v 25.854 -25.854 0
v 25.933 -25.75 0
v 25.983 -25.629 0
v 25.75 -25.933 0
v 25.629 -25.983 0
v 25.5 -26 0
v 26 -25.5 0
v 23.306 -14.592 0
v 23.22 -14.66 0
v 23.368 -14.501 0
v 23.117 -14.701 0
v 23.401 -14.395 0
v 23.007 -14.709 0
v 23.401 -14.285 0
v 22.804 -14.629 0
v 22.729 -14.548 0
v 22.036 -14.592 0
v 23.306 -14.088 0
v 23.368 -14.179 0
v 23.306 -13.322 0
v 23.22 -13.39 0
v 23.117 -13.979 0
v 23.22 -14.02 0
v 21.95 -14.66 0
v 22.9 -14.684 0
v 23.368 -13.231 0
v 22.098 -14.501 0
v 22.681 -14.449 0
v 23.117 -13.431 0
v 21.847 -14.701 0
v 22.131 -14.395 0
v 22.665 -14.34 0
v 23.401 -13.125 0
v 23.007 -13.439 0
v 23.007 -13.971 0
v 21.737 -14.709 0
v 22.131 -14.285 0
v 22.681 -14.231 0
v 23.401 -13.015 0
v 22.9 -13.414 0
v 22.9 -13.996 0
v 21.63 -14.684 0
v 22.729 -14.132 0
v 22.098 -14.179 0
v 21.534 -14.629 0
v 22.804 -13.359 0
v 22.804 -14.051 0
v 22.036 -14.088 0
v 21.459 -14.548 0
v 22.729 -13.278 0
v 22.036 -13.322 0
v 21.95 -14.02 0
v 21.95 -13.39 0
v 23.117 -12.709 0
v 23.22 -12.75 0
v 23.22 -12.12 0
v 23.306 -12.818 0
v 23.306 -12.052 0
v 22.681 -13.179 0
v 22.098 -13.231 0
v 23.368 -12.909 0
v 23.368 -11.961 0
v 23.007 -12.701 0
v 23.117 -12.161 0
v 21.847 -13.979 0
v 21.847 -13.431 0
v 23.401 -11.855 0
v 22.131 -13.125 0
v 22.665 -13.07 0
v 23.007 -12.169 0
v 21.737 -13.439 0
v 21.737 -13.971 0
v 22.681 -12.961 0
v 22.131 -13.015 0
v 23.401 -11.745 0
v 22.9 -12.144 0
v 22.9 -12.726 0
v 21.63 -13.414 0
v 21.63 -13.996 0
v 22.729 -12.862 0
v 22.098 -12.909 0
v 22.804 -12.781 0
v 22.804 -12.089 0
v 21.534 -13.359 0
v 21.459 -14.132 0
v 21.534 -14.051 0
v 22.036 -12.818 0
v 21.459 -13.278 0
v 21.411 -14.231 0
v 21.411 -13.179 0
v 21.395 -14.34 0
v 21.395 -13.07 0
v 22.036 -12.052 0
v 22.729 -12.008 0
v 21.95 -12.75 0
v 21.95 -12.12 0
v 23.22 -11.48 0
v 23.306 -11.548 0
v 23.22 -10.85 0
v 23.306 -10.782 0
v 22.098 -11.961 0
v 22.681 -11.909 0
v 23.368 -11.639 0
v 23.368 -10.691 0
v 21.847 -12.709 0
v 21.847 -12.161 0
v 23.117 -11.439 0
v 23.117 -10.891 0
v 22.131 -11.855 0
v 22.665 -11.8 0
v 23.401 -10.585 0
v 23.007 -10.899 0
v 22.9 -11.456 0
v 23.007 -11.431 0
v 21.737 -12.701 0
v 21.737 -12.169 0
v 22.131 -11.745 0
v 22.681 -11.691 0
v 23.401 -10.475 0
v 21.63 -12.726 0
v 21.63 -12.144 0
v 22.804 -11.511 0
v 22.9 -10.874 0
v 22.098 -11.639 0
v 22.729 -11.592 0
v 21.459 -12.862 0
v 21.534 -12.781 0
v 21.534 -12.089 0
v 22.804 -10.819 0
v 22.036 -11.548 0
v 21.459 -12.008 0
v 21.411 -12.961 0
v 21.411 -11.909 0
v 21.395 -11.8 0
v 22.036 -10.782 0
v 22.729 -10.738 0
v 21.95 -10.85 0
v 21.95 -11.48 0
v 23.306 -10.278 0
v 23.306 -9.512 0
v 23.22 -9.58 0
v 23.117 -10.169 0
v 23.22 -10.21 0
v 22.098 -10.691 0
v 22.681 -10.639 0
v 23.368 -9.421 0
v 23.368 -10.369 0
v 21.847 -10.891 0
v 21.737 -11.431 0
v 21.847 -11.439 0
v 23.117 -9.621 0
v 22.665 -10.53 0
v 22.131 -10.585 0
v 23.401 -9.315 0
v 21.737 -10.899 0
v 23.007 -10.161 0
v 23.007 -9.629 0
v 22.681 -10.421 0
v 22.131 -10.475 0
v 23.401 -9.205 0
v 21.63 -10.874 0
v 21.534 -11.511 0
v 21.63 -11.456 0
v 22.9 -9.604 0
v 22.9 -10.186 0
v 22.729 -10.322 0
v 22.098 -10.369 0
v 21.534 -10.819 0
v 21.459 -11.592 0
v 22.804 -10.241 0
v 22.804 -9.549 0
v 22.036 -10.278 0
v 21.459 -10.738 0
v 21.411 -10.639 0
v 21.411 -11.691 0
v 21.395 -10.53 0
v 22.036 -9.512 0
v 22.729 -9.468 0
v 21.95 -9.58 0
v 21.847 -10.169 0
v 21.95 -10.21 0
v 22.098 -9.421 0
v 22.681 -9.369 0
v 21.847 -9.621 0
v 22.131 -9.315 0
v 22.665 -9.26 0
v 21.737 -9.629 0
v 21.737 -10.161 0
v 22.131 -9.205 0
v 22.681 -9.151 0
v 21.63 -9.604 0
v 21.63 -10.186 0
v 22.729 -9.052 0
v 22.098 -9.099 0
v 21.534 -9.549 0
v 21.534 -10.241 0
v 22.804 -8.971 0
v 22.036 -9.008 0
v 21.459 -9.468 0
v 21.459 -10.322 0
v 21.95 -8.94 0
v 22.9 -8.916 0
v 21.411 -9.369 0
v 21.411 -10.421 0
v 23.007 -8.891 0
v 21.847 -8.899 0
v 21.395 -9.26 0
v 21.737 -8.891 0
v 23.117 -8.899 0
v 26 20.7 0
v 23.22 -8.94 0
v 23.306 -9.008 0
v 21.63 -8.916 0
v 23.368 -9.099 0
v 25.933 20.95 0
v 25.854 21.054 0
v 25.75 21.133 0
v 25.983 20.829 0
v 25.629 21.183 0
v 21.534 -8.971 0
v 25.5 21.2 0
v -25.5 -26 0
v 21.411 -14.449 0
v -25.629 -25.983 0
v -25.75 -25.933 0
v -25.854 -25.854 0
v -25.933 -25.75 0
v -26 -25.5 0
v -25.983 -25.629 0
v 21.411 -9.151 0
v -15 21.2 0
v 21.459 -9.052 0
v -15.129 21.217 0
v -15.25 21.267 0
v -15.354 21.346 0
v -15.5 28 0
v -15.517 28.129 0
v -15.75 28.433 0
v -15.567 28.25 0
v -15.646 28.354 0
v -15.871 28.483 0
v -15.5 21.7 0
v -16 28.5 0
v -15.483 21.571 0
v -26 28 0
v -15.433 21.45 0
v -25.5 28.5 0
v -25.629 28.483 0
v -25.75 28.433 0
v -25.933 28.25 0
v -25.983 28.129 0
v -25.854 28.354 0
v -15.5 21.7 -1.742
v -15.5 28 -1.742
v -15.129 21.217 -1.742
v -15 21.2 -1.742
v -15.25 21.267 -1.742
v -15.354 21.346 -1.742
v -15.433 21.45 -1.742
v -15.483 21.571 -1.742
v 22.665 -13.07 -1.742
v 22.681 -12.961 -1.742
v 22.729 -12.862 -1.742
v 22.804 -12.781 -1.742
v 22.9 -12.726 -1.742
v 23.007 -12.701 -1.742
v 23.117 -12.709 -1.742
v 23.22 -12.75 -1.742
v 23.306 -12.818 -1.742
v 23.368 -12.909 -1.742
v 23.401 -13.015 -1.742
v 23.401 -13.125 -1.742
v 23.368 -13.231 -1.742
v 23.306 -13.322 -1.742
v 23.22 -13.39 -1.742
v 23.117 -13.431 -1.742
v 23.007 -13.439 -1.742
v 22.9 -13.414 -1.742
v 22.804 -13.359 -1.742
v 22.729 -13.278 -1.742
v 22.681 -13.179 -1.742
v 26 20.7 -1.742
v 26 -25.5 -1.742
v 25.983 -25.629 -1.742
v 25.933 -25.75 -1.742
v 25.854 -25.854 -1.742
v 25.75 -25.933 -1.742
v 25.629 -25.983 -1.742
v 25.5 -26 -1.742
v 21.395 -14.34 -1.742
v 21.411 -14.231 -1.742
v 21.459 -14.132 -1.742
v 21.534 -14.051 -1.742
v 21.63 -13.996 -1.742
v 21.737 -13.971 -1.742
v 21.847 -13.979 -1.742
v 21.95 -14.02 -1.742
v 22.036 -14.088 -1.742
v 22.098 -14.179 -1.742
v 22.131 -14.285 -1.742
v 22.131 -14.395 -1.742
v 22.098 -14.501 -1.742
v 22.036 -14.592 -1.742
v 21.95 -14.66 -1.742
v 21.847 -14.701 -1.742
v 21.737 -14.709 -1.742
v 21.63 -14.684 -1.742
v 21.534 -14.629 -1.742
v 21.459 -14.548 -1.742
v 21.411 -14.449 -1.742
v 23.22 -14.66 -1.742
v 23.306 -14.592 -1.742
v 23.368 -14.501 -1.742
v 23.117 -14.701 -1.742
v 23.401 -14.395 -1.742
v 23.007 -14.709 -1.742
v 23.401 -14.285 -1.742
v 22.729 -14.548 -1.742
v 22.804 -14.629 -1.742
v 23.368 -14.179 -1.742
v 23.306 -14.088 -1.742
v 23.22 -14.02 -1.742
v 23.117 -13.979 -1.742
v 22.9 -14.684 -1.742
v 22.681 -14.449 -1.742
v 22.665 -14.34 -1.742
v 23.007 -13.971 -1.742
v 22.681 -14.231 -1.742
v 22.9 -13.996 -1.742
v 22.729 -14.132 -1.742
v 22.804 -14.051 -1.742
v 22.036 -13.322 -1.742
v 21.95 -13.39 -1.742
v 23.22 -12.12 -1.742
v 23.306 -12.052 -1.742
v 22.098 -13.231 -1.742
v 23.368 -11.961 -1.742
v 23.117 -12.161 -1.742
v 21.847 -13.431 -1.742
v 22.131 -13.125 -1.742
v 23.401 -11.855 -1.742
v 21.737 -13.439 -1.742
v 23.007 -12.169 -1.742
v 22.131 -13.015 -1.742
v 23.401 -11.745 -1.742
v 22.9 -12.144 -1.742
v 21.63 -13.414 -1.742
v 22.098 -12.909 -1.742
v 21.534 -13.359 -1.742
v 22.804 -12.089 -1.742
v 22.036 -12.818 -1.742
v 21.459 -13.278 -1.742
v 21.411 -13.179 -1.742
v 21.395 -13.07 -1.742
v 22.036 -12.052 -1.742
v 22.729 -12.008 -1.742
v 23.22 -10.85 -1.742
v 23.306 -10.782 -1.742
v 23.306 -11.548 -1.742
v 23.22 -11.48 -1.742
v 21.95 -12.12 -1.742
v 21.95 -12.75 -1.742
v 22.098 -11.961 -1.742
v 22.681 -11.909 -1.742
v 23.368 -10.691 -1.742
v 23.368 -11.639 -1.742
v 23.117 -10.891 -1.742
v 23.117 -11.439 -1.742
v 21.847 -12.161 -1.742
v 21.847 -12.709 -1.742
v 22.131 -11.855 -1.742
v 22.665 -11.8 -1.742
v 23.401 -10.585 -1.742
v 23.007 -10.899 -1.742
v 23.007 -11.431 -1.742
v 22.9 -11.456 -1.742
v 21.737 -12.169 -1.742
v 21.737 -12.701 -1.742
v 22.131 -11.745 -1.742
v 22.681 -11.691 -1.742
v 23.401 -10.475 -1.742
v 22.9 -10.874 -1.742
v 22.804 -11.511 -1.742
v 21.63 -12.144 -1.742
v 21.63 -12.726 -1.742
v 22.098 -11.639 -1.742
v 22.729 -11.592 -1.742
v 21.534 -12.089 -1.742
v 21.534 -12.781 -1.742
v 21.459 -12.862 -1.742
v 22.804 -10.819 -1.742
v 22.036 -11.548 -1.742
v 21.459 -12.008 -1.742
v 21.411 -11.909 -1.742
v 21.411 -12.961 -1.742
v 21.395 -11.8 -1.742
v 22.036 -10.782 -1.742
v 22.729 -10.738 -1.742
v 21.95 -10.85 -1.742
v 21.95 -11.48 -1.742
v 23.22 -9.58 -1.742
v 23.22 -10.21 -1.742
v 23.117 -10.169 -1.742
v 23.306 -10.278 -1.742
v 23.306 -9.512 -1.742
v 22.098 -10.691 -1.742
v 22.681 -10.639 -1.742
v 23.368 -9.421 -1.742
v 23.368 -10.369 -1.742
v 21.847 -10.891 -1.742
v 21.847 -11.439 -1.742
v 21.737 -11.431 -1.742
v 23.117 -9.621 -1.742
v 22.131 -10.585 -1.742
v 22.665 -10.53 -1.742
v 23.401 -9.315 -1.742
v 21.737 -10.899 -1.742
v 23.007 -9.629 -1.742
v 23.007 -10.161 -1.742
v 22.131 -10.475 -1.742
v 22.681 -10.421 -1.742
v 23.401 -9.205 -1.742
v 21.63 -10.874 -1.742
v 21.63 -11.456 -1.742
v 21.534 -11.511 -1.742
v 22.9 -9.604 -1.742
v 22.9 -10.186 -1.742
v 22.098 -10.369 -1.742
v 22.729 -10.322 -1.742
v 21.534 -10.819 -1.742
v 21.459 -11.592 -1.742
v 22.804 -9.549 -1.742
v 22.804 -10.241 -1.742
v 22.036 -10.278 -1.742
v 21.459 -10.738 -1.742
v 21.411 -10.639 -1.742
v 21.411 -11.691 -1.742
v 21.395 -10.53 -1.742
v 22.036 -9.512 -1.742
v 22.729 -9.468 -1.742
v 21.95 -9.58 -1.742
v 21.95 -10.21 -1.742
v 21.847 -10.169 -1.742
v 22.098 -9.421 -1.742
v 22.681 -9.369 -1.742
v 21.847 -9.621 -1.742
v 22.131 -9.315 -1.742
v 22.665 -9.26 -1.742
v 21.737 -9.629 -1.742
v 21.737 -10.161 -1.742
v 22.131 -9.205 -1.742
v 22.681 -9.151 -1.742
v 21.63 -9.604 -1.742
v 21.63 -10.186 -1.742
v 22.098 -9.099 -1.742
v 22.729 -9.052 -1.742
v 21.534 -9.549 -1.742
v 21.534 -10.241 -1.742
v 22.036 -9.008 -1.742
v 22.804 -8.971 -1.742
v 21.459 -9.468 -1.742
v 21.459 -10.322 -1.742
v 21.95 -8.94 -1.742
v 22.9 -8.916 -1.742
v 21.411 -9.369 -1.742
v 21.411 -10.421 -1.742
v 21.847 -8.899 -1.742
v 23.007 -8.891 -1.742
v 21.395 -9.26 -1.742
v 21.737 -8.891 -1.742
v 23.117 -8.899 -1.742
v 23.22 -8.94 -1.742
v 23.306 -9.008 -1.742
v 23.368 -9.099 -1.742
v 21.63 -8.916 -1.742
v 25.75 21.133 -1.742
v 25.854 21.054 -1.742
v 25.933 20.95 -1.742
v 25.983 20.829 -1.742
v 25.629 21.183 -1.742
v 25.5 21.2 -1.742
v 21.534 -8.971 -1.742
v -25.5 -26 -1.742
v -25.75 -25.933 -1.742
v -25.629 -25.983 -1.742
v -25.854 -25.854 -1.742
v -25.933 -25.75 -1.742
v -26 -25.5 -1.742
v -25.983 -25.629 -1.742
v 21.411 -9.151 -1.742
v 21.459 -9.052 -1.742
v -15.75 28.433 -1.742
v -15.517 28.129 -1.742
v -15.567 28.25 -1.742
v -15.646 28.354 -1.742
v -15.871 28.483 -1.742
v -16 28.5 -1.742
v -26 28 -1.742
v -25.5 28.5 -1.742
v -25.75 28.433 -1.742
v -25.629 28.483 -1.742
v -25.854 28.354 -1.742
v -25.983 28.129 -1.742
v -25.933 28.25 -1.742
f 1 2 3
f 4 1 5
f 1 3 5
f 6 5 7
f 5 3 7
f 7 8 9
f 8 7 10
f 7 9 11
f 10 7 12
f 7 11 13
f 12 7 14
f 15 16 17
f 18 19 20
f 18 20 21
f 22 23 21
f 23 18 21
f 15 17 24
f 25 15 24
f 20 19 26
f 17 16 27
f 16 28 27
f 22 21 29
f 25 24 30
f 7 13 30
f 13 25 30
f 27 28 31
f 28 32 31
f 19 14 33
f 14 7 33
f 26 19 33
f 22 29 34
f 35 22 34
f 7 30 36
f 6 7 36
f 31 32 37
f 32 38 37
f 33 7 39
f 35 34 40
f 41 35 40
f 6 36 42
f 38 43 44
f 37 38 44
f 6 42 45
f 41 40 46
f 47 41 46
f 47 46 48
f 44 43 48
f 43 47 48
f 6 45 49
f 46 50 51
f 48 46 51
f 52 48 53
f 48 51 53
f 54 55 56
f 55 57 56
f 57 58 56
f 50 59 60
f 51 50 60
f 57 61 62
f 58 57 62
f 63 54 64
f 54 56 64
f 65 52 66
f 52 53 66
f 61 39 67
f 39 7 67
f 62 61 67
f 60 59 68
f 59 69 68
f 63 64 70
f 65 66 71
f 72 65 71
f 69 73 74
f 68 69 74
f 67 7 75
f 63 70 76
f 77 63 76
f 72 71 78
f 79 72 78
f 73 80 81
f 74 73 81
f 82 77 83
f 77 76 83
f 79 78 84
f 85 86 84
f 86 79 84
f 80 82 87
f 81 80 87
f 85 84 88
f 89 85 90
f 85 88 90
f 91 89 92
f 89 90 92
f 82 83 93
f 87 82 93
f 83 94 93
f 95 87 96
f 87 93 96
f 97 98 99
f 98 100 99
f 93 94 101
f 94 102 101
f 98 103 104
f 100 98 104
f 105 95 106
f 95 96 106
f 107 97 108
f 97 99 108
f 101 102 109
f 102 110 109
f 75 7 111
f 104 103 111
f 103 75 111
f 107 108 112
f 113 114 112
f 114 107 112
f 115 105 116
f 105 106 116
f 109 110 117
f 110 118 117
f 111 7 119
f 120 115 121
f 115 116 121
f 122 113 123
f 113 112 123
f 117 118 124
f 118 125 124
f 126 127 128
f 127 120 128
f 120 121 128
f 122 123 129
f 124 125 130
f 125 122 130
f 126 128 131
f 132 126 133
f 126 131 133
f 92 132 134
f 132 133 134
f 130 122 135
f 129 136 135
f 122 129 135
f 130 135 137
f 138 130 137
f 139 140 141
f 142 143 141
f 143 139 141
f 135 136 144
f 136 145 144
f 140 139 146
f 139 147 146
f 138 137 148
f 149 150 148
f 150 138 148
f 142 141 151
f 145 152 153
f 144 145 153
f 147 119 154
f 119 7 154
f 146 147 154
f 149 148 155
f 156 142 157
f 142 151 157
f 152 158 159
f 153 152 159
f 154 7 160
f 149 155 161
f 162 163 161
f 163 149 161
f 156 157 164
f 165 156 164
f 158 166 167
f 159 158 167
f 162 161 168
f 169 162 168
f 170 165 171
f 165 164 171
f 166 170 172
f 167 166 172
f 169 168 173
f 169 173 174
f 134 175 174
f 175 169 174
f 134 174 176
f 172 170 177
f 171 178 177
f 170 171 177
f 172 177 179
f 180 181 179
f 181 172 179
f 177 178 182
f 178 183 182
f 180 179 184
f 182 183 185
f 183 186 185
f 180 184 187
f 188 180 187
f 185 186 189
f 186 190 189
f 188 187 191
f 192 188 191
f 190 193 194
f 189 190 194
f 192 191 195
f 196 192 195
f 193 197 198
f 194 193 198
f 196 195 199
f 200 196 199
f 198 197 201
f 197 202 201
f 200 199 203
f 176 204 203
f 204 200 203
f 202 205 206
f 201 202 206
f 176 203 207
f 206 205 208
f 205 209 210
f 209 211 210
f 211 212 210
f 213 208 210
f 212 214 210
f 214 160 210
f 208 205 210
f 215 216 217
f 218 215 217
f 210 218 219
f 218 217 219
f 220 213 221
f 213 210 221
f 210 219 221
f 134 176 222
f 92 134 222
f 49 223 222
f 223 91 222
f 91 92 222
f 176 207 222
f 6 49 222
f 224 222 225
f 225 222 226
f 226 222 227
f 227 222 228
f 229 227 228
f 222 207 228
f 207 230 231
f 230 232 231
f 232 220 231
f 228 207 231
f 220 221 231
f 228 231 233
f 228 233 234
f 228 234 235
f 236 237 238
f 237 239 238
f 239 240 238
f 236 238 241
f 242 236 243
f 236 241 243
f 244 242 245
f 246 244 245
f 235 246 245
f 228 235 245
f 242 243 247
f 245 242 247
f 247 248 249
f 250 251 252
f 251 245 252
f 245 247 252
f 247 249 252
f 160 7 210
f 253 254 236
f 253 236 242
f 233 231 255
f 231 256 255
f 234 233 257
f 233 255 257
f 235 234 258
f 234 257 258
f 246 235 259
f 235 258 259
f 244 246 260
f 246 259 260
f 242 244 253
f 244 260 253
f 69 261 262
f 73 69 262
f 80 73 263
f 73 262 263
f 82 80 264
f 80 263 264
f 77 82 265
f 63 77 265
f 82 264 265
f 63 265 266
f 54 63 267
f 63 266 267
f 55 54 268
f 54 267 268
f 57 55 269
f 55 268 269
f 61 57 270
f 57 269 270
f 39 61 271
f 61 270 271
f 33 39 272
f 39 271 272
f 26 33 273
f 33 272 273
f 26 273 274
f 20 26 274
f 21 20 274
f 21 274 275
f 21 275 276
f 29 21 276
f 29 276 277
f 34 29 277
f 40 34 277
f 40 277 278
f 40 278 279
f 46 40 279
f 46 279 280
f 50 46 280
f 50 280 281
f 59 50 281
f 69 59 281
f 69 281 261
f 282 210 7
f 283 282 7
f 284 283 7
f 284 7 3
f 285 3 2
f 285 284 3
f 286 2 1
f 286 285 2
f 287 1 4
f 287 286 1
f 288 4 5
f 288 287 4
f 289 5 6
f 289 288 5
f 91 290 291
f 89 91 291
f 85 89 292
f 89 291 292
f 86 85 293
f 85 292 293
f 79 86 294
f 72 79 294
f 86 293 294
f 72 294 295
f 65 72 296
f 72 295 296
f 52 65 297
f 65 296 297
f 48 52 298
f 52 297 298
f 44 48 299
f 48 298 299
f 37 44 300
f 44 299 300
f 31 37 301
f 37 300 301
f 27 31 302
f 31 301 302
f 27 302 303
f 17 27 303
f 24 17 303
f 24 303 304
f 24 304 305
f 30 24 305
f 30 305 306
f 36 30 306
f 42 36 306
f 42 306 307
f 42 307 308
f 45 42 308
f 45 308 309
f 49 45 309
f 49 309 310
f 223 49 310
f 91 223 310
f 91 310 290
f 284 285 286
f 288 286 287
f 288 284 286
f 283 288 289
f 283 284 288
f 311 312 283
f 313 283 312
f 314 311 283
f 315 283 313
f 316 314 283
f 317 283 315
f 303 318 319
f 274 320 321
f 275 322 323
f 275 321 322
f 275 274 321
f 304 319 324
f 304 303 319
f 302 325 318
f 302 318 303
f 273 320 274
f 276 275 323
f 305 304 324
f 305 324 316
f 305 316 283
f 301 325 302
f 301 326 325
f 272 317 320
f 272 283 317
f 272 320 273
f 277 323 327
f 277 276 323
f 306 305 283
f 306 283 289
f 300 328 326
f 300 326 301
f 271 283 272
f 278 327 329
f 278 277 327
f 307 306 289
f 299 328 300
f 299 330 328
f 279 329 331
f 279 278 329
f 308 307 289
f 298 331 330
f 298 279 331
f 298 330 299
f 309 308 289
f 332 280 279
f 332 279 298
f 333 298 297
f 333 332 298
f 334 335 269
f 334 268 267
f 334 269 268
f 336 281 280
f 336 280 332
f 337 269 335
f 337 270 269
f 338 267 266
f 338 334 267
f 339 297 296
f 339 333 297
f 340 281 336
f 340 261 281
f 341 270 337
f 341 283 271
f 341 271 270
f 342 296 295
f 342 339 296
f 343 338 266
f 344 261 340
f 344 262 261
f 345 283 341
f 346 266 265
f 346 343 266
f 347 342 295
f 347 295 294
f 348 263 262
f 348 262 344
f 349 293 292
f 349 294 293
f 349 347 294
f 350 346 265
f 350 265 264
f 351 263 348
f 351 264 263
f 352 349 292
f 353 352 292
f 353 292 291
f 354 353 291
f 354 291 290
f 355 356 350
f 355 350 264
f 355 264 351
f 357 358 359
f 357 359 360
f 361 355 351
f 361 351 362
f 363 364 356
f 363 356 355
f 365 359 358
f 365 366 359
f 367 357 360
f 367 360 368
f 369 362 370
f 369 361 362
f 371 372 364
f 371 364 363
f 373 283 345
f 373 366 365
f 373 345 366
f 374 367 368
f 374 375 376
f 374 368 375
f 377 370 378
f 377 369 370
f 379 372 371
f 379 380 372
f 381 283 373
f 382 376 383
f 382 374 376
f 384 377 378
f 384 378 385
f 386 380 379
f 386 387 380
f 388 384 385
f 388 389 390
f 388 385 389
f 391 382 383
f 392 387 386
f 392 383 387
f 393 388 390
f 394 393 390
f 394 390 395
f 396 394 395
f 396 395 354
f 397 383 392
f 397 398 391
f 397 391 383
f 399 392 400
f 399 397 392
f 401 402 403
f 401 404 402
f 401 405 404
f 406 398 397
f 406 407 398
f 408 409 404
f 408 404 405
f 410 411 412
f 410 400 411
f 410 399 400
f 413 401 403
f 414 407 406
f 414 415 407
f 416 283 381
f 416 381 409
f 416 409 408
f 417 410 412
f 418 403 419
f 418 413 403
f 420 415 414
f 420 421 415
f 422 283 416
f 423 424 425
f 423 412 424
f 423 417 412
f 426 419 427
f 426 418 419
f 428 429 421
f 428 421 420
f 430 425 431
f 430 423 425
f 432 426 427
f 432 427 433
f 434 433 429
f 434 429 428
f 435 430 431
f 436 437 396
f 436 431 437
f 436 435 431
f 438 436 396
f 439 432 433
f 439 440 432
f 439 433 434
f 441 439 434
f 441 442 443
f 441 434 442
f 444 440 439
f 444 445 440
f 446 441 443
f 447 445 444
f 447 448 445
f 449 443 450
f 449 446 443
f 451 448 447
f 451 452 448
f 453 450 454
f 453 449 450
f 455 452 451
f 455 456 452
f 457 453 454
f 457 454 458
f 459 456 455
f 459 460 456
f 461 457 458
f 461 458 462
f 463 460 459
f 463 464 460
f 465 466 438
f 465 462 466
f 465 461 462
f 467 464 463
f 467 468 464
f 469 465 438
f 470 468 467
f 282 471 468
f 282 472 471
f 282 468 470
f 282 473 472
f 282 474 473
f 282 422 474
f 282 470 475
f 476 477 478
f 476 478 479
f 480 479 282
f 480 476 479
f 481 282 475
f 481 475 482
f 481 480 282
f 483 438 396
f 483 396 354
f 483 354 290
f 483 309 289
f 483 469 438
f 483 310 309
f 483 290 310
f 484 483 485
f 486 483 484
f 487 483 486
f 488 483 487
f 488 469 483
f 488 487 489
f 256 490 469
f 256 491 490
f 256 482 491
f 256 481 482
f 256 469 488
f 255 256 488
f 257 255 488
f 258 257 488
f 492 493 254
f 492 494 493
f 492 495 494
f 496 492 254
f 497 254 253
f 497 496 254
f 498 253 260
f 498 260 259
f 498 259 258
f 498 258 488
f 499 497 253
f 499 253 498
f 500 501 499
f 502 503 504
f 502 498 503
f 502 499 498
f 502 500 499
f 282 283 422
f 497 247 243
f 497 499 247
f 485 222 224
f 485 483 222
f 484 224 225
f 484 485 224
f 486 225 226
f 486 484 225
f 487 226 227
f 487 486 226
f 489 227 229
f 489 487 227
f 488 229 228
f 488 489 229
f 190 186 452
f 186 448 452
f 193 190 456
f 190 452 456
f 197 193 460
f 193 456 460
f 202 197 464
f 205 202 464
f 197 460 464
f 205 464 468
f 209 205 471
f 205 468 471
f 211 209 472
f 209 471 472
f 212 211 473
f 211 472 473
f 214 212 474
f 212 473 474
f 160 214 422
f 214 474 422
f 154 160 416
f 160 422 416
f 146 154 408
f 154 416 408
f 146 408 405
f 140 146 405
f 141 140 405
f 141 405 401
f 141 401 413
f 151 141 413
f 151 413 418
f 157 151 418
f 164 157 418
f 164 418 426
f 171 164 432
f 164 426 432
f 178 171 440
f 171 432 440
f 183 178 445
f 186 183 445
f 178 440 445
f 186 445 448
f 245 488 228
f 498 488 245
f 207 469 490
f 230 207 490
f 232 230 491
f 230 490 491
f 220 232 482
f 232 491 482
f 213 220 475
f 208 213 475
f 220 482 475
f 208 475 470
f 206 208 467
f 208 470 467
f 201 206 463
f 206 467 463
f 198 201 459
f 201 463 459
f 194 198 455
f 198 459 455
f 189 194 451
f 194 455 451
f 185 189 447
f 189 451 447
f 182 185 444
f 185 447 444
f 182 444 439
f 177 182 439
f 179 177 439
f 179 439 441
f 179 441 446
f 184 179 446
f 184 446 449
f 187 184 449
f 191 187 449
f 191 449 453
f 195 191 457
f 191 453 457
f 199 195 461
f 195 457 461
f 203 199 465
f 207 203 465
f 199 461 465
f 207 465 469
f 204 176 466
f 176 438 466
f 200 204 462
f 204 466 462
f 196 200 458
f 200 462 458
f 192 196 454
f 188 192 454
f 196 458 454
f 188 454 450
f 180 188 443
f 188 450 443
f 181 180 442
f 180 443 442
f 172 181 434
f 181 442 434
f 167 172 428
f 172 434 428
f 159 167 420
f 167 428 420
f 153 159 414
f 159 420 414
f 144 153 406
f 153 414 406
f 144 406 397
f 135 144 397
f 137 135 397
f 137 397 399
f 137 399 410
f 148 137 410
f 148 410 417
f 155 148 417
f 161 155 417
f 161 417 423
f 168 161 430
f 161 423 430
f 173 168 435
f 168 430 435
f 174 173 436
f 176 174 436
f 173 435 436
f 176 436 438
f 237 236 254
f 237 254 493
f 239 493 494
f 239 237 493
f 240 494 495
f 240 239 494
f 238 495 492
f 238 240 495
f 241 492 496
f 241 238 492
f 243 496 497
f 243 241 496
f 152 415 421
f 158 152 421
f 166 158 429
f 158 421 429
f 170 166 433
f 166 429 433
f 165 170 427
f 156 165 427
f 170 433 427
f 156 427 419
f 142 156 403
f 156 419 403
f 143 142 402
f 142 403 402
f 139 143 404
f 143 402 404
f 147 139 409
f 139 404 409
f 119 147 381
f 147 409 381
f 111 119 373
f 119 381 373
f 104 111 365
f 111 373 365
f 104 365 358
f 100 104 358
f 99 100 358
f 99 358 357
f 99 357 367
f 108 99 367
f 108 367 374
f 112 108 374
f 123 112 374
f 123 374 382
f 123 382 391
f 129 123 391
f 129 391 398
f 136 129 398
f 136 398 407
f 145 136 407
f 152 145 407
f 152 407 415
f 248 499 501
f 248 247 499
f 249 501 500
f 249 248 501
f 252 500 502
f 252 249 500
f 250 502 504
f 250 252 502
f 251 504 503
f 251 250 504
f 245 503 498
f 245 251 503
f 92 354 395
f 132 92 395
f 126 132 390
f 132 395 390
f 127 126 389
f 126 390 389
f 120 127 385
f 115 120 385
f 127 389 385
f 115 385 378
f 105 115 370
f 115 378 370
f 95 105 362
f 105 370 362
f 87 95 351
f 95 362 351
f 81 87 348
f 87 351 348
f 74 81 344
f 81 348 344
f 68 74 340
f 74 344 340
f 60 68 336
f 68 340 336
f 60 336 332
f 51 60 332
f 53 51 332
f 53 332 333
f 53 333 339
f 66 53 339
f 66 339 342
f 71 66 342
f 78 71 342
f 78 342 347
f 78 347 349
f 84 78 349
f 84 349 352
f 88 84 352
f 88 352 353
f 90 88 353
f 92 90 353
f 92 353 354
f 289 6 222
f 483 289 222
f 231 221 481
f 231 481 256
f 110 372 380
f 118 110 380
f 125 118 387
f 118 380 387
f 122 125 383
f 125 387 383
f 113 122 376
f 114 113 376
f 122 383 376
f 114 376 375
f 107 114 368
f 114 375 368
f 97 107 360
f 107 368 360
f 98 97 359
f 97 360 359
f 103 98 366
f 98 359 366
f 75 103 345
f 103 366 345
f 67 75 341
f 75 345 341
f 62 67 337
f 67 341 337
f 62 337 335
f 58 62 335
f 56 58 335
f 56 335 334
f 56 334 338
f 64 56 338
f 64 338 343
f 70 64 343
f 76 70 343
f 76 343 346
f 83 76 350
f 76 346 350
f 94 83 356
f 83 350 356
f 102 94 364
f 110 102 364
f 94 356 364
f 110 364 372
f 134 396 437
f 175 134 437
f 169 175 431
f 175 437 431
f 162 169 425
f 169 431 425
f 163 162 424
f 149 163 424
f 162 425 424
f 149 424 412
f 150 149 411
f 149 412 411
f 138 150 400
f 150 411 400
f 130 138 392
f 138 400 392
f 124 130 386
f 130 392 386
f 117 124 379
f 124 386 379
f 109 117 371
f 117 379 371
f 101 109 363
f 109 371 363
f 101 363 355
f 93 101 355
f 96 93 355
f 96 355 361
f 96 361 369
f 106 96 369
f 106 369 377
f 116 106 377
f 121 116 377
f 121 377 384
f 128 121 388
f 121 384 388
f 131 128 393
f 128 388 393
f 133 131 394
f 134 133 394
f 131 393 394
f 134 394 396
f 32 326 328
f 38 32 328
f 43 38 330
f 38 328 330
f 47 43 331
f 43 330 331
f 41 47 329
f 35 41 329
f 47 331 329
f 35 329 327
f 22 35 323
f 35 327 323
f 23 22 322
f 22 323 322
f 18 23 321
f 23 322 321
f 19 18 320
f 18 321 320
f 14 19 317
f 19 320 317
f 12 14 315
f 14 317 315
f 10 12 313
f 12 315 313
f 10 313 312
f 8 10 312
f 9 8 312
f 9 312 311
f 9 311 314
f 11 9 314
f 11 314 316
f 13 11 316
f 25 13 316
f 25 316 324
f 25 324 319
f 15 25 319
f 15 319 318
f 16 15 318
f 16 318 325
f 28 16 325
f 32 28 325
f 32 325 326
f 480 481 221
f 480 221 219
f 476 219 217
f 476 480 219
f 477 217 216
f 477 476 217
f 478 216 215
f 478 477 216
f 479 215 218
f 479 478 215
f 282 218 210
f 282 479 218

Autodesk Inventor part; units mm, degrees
ref_plane "YZ Plane" through (0, 0, 0) normal (1, 0, 0) x (0, 1, 0)
ref_plane "XZ Plane" through (0, 0, 0) normal (0, 1, 0) x (-1, 0, 0)
sketch "Boceto1" plane through (0, 0, 0) normal (0, 0, 1) x (1, 0, 0)
  line L0 (-26, 26) -> (26, 26)
  line L1 (26, 26) -> (26, -26)
  line L2 (26, -26) -> (-26, -26)
  line L3 (-26, -26) -> (-26, 26)
  line L4 (-26, 26) -> (26, -26) construction
  line L5 (26, 26) -> (-26, -26) construction
  point P0 (0, 0)
  dimension "d0" = 52
  dimension "d1" = 52
extrude "Extrusión1" add sketch "Boceto1" against normal blind 1.742
fillet "Empalme1" radius 0.5 4 edges at (26, 26, -0.871) (-26, 26, -0.871) (-26, -26, -0.871) (26, -26, -0.871)
ref_plane "Plano de trabajo1" through (0, 0, -1.6) normal (0, 0, 1) x (1, 0, 0)
sketch "Boceto6" plane through (0, 0, 0) normal (0, 0, 1) x (1, 0, 0)
  line L0 (-25.5, 26) -> (25.5, 26) construction
  line L1 (-25.5, 26) -> (25.5, 26) construction
  line L2 (-15.5, 26) -> (26, 26)
  line L3 (26, 26) -> (26, 21.2)
  line L4 (26, 21.2) -> (-15.5, 21.2)
  line L5 (-15.5, 21.2) -> (-15.5, 26)
  line L6 (26, 25.5) -> (26, -25.5) projected
  point P0 (0, 0)
  dimension "d14" = 4.8
  dimension "d15" = 41.5
extrude "Extrusión4" cut sketch "Boceto6" against normal through all
sketch "Boceto7" plane through (0, 0, -1.742) normal (0, 0, -1) x (-1, 0, 0)
  line L0 (25.5, 26) -> (15.5, 26) projected
  arc A0 (26, 25.5) -> (25.5, 26) centre (25.5, 25.5) ccw projected
  line L1 (26, 25.5) -> (26, 28.5)
  line L2 (26, 28.5) -> (15.5, 28.5)
  line L3 (15.5, 28.5) -> (15.5, 26)
  point P0 (0, 0)
  dimension "d18" = 2.5
extrude "Extrusión5" add sketch "Boceto7" against normal up to surface (1.742 mm away)
sketch "Boceto9" plane through (0, 0, -1.742) normal (0, 0, -1) x (-1, 0, 0)
  circle A0 centre (-21.765, -9.26) radius 0.37 projected
  circle A1 centre (-23.035, -9.26) radius 0.37 projected
  circle A2 centre (-23.035, -10.53) radius 0.37 projected
  circle A3 centre (-21.765, -10.53) radius 0.37 projected
  circle A4 centre (-23.035, -11.8) radius 0.37 projected
  circle A5 centre (-21.765, -11.8) radius 0.37 projected
  circle A6 centre (-23.035, -13.07) radius 0.37 projected
  circle A7 centre (-21.765, -13.07) radius 0.37 projected
  circle A8 centre (-23.035, -14.34) radius 0.37 projected
  circle A9 centre (-21.765, -14.34) radius 0.37 projected
  point P0 (0, 0)
extrude "Extrusión6" cut sketch "Boceto9" against normal up to surface (1.742 mm away)
fillet "Empalme2" radius 0.5 4 edges at (26, 21.2, -0.871) (-15.5, 21.2, -0.871) (-15.5, 28.5, -0.871) (-26, 28.5, -0.871)
properties part number "hw_DAA - PCB Power" material "PCB"
